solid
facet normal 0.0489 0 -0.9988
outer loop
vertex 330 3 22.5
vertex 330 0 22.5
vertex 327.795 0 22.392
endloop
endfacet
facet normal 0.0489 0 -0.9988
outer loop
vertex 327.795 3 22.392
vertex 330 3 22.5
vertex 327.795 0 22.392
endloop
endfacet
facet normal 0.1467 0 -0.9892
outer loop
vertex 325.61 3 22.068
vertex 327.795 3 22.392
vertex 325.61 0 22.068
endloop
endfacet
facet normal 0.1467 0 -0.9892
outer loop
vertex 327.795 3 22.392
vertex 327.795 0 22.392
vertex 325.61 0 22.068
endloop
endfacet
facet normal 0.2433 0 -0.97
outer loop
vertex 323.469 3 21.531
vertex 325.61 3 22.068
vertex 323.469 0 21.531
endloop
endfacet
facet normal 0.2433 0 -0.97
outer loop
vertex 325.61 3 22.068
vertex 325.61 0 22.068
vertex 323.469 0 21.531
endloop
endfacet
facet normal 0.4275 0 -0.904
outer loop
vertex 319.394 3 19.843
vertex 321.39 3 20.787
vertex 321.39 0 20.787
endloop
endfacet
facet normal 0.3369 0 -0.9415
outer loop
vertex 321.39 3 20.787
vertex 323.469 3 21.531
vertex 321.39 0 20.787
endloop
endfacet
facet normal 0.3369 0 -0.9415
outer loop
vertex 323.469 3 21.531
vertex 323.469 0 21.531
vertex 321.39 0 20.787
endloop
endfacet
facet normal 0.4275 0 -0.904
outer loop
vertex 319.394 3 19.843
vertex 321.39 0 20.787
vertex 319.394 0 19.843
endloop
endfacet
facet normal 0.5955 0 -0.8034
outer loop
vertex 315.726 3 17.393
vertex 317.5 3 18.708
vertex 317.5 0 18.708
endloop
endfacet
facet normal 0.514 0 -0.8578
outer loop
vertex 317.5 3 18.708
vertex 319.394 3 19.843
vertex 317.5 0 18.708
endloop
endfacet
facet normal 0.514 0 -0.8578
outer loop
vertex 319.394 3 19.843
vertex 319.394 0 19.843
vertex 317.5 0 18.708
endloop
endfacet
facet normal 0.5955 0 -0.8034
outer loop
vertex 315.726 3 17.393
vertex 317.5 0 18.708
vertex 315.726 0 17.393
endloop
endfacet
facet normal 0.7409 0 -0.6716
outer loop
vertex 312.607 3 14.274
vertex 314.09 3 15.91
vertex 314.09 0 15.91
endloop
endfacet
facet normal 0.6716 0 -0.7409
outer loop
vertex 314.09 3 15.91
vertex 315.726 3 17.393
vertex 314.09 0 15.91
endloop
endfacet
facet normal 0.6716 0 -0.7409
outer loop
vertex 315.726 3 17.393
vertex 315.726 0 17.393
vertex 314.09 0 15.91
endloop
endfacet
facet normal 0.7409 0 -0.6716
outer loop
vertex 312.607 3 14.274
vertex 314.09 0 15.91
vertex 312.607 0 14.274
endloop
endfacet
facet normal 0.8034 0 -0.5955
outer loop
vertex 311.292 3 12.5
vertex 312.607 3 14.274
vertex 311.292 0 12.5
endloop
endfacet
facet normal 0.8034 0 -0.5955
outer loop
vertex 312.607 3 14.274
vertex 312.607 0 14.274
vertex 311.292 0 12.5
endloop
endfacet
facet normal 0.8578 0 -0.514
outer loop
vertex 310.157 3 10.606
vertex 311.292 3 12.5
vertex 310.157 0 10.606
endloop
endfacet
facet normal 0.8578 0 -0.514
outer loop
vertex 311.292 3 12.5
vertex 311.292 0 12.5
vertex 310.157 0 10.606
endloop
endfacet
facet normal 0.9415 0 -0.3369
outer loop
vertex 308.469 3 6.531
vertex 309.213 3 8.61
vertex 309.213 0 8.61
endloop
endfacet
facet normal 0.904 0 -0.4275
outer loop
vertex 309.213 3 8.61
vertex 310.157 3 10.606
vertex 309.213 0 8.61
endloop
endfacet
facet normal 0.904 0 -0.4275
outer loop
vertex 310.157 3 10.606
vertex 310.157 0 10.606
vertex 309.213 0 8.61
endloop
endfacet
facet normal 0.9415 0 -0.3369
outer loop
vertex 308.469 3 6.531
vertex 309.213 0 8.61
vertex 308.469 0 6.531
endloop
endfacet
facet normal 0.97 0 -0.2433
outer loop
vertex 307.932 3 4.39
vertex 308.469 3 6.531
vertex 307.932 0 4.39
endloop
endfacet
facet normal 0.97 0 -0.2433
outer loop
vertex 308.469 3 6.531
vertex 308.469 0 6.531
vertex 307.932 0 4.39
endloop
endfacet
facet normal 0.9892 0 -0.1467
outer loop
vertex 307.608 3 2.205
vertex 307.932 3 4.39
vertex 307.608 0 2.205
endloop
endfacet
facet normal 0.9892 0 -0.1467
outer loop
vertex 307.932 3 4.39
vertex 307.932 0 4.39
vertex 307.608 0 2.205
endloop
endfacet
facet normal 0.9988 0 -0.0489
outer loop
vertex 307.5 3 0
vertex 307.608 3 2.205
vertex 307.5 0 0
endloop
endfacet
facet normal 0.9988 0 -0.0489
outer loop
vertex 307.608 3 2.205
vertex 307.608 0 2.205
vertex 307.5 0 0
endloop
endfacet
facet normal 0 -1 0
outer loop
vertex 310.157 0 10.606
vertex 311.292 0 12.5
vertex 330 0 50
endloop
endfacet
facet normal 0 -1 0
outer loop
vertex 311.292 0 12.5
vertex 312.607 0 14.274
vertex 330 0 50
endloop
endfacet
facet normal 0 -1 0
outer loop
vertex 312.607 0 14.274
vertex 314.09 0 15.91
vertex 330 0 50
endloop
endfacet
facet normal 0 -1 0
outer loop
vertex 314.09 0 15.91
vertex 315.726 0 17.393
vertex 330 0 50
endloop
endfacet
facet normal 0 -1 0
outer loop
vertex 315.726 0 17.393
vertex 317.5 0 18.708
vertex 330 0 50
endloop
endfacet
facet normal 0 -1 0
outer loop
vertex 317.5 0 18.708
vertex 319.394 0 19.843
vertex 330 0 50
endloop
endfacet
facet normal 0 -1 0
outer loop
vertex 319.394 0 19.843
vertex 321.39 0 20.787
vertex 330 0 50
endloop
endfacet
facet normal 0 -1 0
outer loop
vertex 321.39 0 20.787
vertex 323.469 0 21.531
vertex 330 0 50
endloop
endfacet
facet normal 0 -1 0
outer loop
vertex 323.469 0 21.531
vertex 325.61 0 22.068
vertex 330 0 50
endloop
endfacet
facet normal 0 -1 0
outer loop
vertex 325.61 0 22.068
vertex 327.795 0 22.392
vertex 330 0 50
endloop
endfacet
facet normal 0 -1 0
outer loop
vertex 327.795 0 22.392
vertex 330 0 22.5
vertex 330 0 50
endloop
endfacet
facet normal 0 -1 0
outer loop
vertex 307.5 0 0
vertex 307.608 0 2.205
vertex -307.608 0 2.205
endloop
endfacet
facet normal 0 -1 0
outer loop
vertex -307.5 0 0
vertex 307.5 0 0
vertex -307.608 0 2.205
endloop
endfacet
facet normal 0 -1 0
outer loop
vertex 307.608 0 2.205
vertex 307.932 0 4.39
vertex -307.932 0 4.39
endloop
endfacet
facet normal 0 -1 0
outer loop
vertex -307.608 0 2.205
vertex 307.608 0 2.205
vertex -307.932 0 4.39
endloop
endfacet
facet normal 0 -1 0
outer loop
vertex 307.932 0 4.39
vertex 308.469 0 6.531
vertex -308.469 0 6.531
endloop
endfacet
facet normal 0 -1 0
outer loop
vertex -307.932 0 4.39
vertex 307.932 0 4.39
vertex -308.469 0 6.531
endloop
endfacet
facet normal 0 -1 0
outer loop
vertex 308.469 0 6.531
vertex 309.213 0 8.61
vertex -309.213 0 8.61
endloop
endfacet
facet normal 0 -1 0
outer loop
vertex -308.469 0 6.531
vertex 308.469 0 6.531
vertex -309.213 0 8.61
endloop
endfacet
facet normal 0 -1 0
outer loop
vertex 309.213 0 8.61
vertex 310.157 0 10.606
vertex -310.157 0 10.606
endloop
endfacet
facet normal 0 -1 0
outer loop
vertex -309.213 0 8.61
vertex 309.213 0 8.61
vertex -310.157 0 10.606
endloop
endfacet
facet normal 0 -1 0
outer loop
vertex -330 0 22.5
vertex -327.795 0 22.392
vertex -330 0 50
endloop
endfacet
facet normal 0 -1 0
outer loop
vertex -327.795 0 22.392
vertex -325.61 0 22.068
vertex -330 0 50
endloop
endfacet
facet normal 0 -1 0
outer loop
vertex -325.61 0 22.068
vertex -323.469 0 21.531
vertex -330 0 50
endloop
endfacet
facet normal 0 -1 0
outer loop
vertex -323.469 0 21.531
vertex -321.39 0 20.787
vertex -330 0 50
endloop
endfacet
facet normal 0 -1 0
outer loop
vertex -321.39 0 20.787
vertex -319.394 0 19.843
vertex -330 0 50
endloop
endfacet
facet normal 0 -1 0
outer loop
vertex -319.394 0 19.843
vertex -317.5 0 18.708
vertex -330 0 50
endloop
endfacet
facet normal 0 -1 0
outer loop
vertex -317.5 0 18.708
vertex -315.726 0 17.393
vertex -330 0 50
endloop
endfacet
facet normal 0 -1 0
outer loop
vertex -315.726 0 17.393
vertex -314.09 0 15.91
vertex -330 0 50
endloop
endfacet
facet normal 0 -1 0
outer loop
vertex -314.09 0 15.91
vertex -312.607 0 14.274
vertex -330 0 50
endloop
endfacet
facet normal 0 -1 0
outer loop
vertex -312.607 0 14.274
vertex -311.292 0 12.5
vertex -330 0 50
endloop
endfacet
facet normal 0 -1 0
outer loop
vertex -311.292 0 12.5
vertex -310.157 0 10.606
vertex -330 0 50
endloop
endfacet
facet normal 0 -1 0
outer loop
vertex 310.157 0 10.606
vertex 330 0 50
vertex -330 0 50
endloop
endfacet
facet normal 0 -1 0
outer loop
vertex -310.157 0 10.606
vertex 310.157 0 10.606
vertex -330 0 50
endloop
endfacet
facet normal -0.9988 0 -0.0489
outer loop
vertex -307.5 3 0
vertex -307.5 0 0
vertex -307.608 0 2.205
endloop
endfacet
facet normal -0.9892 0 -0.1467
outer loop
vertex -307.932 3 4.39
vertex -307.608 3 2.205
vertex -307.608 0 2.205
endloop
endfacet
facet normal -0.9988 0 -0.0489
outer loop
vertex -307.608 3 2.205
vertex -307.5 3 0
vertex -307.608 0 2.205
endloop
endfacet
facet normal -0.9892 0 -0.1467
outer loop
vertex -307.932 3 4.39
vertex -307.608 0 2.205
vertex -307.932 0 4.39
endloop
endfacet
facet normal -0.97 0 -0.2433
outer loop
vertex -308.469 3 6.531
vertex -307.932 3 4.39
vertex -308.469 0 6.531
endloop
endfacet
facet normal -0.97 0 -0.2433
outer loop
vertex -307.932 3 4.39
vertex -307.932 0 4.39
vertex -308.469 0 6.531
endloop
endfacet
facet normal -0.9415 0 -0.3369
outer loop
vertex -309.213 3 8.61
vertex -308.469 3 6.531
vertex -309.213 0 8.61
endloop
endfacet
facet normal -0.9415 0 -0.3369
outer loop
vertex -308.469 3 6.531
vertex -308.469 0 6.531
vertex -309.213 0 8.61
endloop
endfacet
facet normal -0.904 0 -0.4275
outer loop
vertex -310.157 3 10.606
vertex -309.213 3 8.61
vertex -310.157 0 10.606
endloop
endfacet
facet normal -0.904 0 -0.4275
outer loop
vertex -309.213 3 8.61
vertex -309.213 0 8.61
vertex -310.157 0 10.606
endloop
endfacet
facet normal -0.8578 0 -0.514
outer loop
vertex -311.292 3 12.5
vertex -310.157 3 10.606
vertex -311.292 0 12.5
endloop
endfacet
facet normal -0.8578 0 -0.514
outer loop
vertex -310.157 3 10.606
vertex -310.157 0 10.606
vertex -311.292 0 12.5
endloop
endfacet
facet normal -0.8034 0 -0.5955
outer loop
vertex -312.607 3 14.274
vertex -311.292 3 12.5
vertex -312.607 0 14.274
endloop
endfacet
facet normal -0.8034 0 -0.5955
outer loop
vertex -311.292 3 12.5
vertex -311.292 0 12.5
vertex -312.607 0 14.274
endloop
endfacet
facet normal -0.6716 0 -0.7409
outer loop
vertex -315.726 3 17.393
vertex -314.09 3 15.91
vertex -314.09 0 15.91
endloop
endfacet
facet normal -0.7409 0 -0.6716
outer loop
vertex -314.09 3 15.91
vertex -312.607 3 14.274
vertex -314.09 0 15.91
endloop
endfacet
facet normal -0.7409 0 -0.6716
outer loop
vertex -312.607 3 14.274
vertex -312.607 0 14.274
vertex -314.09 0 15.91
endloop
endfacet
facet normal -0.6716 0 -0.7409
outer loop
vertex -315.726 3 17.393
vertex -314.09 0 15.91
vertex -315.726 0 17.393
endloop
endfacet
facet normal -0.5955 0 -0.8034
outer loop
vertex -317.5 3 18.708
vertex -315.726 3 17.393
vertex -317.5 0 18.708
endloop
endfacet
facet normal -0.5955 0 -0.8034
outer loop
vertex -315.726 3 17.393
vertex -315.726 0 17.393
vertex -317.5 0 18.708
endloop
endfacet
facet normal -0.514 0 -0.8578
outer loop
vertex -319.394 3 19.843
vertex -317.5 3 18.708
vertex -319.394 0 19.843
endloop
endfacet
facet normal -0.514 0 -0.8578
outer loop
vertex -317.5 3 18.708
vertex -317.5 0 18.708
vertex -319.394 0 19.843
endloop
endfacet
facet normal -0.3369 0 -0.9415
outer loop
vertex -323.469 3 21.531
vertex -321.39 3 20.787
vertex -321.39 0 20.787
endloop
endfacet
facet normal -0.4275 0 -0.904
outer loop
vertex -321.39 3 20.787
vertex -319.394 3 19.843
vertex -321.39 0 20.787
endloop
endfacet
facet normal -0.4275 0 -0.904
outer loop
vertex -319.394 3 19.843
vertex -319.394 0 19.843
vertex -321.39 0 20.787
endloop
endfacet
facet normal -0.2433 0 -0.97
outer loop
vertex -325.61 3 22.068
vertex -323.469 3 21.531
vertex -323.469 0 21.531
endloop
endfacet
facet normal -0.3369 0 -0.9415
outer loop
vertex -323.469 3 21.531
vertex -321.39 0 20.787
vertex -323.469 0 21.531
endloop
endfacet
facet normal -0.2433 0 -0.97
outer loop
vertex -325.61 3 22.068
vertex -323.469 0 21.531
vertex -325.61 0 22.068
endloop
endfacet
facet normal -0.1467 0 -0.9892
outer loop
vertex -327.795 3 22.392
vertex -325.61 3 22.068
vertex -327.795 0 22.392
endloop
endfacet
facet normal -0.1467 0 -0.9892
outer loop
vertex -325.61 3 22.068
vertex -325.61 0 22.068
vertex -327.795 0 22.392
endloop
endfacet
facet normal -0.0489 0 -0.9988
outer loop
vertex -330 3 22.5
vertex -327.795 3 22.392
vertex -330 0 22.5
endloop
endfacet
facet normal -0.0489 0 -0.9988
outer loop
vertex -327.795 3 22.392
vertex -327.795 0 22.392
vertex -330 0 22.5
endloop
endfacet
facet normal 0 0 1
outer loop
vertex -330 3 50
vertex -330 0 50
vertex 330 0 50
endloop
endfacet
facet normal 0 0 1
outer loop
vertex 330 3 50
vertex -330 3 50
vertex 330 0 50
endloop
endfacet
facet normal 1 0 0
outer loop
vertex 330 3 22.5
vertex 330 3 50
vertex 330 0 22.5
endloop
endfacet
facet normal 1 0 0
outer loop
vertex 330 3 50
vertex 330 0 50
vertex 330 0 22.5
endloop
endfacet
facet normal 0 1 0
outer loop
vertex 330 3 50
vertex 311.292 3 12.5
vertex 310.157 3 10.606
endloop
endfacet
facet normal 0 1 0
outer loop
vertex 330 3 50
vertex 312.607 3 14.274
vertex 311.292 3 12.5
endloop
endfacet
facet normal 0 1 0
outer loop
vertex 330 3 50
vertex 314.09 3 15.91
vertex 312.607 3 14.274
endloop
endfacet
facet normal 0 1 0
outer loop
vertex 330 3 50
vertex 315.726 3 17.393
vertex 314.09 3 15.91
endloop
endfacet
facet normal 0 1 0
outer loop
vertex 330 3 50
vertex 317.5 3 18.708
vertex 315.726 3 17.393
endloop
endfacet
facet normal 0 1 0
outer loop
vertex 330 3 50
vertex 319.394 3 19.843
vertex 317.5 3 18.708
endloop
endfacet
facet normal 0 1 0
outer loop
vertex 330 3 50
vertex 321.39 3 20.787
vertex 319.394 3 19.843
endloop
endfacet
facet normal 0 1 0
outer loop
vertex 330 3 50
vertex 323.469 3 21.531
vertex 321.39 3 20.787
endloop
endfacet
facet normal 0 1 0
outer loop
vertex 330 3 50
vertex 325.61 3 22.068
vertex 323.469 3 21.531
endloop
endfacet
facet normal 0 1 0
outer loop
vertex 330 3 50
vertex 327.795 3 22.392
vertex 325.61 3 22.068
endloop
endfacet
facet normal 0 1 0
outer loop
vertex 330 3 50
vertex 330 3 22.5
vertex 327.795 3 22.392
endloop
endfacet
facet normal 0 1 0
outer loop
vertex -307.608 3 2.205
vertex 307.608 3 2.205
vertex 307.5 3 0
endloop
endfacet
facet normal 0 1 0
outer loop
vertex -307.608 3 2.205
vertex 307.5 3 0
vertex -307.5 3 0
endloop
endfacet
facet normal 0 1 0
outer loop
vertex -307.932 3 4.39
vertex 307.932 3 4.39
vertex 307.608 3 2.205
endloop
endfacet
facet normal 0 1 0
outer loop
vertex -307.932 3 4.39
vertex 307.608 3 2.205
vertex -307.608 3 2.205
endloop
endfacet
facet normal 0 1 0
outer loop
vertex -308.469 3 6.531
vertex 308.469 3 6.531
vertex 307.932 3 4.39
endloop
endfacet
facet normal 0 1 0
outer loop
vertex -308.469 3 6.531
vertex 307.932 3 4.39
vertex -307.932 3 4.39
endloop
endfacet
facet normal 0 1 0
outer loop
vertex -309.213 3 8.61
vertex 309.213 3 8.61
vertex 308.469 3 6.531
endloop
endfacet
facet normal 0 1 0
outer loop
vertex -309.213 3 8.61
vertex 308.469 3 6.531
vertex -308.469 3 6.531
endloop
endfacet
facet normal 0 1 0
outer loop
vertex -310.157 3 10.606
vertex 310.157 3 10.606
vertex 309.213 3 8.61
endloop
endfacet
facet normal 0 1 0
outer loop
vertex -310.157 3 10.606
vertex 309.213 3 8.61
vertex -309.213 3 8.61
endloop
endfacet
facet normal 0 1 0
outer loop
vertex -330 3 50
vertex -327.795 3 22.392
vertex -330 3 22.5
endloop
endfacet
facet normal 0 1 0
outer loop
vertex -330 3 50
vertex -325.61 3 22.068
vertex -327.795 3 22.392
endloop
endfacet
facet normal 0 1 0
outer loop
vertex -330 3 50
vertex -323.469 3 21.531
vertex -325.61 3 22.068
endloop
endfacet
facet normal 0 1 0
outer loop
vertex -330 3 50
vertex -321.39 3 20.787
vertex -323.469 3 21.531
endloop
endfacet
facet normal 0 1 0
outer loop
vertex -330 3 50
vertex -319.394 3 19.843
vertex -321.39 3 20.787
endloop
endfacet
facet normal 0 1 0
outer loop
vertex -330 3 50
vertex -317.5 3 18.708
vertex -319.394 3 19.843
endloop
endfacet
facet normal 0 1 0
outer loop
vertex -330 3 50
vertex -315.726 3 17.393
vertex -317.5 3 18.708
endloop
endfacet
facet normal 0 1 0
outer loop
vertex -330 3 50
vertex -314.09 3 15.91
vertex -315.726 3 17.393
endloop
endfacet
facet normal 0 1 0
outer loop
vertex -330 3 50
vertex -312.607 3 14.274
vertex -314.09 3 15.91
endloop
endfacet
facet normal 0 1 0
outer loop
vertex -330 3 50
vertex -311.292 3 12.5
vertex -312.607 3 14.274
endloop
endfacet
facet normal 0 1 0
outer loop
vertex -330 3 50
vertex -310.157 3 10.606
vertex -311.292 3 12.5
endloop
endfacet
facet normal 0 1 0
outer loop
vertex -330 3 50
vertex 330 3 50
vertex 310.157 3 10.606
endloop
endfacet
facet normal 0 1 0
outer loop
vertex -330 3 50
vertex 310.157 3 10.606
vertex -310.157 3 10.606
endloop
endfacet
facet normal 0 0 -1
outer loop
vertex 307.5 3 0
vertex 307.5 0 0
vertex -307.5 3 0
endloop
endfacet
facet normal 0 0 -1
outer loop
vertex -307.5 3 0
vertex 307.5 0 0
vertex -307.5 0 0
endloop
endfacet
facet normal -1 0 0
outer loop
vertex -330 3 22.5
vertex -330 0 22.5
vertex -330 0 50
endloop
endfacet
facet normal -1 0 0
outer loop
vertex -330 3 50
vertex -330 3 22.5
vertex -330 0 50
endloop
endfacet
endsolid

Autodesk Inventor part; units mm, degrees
ref_plane "YZ Plane" through (0, 0, 0) normal (1, 0, 0) x (0, 1, 0)
ref_plane "XZ Plane" through (0, 0, 0) normal (0, 1, 0) x (-1, 0, 0)
ref_plane "XY Plane" through (0, 0, 0) normal (0, 0, 1) x (1, 0, 0)
sketch "Sketch2" plane through (0, 0, 0) normal (0, 1, 0) x (-1, 0, 0)
  line L0 (330, 50) -> (-330, 50)
  line L1 (-330, 50) -> (-330, 0)
  line L2 (-330, 0) -> (330, 0)
  line L3 (330, 0) -> (330, 50)
  circle A0 centre (-330, 0) radius 22.5
  circle A1 centre (330, 0) radius 22.5
  point P0 (0, 0)
  point P1 (0, 0)
  point P2 (-330, 22.5)
  point P3 (-307.5, 0)
  point P4 (307.5, 0)
  point P5 (330, 22.5)
  dimension "d18" = 660
  dimension "d19" = 50
  dimension "d20" = 45
extrude "Plate2" add sketch "Sketch2" along normal blind 3 contours L3 A1 L2 A0 L1 L0
equation "\"d21\" = Thickness"
equation "\"BendReliefWidth\" = Thickness"
equation "\"BendReliefDepth\" = 0.5 * Thickness"
equation "\"CornerReliefSize\" = 4 * Thickness"
equation "\"MinimumRemnant\" = 2 * Thickness"
equation "\"TransitionRadius\" = BendRadius"
equation "\"JacobiRadiusSize\" = BendRadius"
equation "\"GapSize\" = Thickness"
equation "\"Thickness\" = 3"
equation "\"BendRadius\" = 5"
properties part number "MSC 0562 rib cone" material "Stainless Steel"
